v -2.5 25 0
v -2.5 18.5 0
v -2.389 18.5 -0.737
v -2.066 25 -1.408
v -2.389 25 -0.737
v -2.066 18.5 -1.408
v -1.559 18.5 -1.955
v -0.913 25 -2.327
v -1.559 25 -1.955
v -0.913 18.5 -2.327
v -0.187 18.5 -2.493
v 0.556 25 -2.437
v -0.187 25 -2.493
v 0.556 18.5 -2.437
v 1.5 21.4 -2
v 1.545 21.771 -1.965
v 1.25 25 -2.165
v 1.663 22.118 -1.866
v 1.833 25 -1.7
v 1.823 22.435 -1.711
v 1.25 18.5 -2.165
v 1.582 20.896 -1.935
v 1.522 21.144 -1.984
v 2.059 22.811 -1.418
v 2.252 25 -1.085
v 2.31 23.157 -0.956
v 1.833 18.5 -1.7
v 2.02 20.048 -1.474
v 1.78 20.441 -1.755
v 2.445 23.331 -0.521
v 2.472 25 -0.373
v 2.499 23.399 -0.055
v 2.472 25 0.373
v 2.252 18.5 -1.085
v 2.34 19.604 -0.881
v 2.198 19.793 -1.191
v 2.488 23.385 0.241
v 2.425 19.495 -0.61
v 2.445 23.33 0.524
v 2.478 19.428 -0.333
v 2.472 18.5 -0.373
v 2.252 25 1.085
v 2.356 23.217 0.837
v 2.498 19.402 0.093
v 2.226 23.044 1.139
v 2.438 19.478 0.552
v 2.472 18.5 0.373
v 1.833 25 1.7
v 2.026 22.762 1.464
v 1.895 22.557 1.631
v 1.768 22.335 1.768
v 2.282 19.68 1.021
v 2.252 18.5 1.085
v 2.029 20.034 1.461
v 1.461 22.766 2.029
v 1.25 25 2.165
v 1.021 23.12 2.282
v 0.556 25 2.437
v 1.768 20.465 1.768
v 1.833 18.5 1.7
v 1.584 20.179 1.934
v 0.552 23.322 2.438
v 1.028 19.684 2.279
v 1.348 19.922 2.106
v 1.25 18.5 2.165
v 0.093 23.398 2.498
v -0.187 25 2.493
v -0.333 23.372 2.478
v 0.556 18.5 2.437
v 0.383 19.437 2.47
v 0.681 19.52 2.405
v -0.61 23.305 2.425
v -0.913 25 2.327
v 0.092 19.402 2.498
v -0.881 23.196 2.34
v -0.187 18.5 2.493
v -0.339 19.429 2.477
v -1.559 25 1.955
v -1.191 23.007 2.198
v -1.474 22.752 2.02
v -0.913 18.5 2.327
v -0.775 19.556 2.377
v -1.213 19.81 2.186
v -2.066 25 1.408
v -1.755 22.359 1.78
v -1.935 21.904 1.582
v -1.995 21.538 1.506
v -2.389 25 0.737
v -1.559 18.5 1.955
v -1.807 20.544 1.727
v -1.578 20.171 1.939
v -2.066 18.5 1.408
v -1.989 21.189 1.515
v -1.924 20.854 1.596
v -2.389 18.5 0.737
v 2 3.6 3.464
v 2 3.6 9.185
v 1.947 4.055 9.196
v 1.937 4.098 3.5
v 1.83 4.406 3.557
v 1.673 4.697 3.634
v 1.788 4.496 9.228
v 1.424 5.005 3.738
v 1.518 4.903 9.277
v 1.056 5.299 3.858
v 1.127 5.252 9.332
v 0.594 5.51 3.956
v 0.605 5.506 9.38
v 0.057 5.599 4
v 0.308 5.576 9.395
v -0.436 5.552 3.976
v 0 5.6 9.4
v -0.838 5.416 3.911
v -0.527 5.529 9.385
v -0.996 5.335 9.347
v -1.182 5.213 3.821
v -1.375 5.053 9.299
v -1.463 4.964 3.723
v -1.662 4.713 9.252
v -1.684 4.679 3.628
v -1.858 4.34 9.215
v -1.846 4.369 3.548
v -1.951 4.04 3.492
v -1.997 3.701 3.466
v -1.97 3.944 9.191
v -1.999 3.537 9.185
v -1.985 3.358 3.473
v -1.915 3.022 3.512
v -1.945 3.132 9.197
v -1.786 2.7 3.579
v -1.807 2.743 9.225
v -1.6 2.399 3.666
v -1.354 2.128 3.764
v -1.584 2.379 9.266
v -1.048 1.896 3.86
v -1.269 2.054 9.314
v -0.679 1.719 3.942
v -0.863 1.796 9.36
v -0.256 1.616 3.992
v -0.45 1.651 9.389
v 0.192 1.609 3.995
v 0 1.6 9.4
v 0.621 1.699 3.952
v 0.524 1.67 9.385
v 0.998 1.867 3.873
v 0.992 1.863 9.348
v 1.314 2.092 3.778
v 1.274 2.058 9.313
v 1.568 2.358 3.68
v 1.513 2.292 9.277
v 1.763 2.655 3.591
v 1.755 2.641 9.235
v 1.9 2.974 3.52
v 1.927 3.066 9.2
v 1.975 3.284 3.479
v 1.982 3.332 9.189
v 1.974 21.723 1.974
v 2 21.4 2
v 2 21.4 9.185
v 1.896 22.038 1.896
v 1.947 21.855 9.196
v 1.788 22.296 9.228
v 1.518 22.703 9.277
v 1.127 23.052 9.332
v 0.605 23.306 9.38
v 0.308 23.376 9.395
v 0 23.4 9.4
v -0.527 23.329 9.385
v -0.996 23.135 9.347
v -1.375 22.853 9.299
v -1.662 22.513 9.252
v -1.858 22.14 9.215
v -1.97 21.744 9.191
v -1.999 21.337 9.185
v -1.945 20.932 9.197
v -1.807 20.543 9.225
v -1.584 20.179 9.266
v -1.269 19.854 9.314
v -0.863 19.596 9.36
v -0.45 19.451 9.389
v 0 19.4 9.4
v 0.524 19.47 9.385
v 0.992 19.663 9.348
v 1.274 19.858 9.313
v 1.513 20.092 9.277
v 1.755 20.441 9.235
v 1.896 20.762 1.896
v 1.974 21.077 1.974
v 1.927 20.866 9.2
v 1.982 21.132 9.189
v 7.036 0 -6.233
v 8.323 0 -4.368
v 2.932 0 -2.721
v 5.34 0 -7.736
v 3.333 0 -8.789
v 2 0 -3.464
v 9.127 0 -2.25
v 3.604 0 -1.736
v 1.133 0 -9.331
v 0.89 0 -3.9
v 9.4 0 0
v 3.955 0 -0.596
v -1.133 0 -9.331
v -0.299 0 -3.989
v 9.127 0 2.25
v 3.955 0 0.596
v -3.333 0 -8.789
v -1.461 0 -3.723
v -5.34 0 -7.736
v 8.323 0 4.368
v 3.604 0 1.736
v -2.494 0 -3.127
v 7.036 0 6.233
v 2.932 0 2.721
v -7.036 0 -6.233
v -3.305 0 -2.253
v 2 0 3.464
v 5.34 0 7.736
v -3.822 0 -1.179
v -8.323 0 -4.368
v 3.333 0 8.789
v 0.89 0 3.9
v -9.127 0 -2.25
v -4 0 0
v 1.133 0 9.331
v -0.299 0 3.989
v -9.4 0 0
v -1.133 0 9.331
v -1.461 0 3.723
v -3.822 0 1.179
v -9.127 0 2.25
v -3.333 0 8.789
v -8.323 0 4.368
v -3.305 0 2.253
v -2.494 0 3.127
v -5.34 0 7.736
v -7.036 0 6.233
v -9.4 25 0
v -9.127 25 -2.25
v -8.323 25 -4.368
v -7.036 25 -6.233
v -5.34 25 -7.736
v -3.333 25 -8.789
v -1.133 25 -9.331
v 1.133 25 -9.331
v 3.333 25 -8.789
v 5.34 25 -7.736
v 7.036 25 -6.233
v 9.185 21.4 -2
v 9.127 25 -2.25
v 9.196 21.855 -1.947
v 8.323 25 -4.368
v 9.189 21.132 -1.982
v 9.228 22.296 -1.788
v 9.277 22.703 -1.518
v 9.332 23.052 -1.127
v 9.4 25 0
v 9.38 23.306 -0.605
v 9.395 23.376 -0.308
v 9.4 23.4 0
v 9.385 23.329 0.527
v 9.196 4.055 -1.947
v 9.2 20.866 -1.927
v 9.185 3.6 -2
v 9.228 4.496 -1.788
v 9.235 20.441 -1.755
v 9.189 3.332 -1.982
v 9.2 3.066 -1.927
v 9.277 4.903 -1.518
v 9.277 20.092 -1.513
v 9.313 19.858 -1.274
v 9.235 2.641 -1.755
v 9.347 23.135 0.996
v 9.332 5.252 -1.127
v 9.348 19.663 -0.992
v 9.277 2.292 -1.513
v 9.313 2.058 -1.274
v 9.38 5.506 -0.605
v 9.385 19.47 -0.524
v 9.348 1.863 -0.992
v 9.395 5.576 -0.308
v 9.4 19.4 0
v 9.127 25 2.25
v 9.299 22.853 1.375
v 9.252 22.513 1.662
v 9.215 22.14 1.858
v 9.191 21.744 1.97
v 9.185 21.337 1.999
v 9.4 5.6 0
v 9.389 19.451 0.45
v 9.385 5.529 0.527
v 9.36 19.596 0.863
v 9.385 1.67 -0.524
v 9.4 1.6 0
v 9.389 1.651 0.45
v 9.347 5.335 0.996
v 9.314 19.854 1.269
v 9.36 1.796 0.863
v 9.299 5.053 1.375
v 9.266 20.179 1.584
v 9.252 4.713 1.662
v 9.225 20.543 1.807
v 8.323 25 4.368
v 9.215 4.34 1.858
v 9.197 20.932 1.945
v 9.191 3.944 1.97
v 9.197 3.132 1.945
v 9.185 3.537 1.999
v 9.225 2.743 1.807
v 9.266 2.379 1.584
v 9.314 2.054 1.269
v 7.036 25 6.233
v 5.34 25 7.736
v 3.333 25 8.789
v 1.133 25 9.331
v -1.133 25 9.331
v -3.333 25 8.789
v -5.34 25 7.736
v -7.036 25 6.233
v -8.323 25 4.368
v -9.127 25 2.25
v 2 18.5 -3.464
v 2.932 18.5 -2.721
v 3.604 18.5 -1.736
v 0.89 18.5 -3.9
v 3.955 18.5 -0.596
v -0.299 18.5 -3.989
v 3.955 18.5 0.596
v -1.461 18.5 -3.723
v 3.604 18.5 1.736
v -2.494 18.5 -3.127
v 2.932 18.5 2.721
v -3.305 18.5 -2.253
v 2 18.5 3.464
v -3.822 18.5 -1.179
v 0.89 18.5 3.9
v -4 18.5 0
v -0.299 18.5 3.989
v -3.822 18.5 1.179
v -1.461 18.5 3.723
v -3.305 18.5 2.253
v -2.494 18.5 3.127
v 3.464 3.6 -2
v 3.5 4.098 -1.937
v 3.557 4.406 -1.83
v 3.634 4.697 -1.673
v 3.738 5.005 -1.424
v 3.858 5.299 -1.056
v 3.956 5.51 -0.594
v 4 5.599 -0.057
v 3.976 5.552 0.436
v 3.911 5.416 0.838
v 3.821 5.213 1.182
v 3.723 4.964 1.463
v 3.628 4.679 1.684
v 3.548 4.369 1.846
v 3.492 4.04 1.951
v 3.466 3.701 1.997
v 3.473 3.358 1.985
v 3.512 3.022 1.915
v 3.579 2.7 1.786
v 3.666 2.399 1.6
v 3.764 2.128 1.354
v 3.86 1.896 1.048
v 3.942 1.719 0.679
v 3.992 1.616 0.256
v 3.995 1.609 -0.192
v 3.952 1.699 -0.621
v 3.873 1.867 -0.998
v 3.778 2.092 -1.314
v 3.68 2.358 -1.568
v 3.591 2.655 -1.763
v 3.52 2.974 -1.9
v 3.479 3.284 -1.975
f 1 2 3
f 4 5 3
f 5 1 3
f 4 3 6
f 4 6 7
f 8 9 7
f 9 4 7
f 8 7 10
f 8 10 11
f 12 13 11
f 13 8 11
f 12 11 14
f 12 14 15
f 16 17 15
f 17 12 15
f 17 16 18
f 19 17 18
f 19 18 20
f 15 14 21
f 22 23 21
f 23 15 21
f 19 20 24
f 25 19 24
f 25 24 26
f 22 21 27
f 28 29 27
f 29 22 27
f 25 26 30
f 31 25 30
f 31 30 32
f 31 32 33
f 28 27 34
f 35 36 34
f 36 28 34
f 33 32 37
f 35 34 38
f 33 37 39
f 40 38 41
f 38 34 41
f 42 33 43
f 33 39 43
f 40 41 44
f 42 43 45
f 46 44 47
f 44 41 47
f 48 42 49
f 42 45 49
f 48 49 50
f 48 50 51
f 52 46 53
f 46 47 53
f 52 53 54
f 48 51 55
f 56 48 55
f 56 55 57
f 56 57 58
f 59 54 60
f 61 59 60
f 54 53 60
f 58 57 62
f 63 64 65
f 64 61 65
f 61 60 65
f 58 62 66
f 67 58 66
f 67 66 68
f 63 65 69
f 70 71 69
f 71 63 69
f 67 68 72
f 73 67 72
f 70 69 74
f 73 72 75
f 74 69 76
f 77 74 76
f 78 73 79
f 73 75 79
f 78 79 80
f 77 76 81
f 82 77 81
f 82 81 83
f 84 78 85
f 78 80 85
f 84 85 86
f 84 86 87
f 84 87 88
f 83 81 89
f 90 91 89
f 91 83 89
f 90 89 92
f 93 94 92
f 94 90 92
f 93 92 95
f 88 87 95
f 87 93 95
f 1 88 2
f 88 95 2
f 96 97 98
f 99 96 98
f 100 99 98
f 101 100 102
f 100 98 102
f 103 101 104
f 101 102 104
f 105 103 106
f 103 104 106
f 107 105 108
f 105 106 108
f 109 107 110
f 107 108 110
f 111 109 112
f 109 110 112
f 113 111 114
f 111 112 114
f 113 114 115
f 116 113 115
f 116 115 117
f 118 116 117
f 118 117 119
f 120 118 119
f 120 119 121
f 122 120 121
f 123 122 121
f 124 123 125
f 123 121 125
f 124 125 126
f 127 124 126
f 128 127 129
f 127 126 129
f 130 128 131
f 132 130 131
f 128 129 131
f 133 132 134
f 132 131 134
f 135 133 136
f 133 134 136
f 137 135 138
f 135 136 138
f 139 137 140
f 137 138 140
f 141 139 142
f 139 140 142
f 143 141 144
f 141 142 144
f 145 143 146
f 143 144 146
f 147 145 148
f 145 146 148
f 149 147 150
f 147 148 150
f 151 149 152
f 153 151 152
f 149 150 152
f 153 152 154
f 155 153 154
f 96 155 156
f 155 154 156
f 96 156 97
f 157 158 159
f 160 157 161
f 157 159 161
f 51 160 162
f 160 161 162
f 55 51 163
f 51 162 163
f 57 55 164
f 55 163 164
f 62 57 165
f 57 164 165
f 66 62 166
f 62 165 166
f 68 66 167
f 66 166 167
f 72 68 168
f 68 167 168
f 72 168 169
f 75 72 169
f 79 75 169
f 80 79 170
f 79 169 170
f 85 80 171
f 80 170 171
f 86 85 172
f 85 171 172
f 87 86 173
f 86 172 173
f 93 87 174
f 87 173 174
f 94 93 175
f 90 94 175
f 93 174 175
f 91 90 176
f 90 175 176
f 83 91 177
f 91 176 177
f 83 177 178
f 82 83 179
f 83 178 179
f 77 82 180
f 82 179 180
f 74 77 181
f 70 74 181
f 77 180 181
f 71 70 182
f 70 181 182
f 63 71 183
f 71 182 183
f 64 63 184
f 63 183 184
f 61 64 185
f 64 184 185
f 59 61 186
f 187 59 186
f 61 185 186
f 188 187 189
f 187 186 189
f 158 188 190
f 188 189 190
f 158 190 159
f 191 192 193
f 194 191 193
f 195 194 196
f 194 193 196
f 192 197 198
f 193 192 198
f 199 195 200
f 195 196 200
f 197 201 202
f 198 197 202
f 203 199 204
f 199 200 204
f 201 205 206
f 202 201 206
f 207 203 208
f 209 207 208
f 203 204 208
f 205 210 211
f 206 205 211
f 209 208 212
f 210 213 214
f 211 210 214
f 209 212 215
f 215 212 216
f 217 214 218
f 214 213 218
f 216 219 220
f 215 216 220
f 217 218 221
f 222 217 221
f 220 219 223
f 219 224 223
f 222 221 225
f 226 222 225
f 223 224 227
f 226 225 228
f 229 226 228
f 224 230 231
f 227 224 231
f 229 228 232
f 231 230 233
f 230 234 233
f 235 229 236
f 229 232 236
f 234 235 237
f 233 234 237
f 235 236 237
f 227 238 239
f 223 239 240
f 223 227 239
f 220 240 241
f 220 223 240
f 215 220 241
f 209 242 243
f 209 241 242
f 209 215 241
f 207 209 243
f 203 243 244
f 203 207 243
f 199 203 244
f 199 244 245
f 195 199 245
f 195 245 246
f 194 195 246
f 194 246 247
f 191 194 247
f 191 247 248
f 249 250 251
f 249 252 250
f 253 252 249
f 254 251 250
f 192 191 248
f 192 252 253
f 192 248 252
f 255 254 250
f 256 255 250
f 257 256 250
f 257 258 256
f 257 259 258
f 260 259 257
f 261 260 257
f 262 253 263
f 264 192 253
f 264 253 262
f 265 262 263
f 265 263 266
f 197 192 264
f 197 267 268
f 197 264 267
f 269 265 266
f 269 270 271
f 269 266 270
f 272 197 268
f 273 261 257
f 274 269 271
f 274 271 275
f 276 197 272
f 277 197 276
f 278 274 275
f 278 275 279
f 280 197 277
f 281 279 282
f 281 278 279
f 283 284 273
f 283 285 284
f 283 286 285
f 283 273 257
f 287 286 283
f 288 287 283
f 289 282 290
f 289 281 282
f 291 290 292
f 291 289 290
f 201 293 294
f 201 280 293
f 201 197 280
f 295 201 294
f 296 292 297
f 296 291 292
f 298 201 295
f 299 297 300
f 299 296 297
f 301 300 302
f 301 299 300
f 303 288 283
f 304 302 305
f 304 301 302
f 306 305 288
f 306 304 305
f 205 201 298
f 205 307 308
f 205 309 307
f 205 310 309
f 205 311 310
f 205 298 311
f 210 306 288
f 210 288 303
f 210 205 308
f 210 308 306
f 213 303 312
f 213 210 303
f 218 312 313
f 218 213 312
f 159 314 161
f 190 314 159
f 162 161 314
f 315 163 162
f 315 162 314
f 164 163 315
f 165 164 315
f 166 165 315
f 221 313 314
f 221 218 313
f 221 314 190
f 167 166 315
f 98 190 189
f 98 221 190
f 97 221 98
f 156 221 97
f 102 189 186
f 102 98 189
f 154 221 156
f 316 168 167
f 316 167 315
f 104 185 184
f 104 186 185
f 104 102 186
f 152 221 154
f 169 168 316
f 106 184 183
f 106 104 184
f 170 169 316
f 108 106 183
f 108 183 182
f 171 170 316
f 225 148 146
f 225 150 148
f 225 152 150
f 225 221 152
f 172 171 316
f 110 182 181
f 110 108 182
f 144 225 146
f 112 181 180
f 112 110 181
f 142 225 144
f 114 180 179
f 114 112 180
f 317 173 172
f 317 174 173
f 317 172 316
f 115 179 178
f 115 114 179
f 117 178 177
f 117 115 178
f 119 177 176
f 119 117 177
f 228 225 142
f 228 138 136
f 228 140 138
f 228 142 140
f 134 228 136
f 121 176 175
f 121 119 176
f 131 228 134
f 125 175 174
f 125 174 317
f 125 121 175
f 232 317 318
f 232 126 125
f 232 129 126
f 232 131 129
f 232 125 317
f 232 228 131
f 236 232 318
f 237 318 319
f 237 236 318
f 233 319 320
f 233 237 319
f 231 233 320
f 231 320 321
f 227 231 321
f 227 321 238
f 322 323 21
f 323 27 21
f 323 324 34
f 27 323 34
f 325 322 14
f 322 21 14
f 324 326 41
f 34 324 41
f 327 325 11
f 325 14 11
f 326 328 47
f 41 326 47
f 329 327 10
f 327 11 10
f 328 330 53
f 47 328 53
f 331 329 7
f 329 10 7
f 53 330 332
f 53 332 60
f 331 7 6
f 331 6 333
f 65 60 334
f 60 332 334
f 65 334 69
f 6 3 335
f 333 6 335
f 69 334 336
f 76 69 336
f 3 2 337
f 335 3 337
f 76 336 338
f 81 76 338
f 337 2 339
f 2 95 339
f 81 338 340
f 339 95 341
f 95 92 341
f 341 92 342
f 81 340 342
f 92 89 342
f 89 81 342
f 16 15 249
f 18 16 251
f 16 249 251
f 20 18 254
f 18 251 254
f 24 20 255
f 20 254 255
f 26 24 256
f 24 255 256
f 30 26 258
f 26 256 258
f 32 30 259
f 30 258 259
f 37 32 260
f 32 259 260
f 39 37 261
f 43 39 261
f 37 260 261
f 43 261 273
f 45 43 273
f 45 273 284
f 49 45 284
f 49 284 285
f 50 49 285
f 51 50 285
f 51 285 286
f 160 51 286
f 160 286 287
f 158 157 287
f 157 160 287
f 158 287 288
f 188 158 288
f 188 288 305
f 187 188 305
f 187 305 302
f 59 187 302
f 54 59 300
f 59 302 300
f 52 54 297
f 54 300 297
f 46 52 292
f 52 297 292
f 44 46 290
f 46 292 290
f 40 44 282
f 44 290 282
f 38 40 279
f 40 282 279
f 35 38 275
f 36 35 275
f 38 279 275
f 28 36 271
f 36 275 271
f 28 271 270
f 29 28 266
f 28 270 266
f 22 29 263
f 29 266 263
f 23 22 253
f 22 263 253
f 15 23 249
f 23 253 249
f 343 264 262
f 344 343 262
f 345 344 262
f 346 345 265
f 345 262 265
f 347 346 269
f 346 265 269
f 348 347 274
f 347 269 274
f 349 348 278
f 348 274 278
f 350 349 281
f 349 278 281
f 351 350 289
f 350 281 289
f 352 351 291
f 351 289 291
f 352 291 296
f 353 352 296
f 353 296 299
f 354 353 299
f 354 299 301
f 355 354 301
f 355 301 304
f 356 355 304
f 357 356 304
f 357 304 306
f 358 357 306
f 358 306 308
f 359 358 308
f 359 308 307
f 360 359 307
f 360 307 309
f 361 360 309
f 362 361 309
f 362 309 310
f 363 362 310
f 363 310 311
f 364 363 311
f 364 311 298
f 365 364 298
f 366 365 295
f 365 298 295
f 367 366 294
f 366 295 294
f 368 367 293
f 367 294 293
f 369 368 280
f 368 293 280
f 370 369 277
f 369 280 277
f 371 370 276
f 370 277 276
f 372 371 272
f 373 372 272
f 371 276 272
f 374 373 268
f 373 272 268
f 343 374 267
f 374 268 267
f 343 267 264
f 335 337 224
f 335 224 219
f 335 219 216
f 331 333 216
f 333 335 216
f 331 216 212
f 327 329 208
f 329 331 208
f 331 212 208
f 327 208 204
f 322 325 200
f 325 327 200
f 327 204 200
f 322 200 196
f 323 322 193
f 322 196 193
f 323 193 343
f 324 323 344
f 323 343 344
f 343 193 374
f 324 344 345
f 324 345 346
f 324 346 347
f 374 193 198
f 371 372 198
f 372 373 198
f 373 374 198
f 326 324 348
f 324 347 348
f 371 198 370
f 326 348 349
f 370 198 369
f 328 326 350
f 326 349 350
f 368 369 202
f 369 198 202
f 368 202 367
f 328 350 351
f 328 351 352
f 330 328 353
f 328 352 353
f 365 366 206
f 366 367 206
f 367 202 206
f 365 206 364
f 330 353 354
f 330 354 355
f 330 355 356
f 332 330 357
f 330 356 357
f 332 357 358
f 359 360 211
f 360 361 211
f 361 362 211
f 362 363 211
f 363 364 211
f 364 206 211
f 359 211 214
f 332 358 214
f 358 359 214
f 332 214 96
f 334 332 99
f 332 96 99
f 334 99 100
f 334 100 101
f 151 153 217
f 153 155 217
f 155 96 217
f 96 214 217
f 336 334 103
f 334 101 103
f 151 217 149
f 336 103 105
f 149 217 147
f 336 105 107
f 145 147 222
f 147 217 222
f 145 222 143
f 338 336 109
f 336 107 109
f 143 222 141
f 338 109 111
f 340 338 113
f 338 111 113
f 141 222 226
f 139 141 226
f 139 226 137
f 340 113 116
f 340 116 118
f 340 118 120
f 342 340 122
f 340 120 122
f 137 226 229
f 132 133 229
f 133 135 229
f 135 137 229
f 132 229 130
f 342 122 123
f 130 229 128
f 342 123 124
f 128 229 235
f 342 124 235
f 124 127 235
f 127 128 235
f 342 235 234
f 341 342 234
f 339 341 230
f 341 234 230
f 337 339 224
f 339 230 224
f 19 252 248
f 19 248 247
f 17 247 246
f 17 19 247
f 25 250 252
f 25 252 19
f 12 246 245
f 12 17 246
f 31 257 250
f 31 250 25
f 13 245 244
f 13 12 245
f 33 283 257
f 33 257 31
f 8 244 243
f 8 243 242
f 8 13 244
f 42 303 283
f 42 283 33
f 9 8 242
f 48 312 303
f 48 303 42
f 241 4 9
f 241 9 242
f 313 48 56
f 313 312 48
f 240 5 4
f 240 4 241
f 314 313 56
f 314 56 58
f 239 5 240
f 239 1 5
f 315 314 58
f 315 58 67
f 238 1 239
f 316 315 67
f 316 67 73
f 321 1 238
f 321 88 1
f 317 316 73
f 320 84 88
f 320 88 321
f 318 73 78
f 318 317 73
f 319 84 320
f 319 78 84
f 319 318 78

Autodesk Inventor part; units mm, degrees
ref_plane "YZ Plane" through (0, 0, 0) normal (1, 0, 0) x (0, 1, 0)
ref_plane "XZ Plane" through (0, 0, 0) normal (0, 1, 0) x (-1, 0, 0)
sketch "Sketch1" plane through (0, 0, 0) normal (0, 1, 0) x (-1, 0, 0)
  circle A0 centre (0, 0) radius 9.4
  circle A1 centre (0, 0) radius 4
  circle A2 centre (0, 0) radius 2.5
  dimension "d0" = 8
  dimension "d1" = 18.8
  dimension "d2" = 5
extrude "Extrusion1" add sketch "Sketch1" along normal blind 25 contours A0 | A1
extrude "Extrusion2" cut sketch "Sketch1" along normal blind 18.5 contours A1
ref_plane "Work Plane1" through (0, 0, 9.4) normal (0, 0, 1) x (1, 0, 0)
sketch "Sketch2" plane through (0, 0, 9.4) normal (0, 0, 1) x (1, 0, 0)
  circle A0 centre (0, 21.4) radius 2
  circle A1 centre (0, 3.6) radius 2
  line L0 (9.4, 0) -> (-9.4, 0) projected
  line L1 (9.4, 25) -> (-9.4, 25) projected
  point P0 (0, 0)
  dimension "d7" = 4
  dimension "d8" = 3.6
  dimension "d9" = 3.6
extrude "Extrusion3" cut sketch "Sketch2" against normal up to next
pattern_circular "Circular Pattern1" count 2 over 90 about axis through (0, 0, 0) along (0, 1, 0) of "Extrusion3"
equation "\"d9\" = d8"
properties part number "Shaft coupler"
